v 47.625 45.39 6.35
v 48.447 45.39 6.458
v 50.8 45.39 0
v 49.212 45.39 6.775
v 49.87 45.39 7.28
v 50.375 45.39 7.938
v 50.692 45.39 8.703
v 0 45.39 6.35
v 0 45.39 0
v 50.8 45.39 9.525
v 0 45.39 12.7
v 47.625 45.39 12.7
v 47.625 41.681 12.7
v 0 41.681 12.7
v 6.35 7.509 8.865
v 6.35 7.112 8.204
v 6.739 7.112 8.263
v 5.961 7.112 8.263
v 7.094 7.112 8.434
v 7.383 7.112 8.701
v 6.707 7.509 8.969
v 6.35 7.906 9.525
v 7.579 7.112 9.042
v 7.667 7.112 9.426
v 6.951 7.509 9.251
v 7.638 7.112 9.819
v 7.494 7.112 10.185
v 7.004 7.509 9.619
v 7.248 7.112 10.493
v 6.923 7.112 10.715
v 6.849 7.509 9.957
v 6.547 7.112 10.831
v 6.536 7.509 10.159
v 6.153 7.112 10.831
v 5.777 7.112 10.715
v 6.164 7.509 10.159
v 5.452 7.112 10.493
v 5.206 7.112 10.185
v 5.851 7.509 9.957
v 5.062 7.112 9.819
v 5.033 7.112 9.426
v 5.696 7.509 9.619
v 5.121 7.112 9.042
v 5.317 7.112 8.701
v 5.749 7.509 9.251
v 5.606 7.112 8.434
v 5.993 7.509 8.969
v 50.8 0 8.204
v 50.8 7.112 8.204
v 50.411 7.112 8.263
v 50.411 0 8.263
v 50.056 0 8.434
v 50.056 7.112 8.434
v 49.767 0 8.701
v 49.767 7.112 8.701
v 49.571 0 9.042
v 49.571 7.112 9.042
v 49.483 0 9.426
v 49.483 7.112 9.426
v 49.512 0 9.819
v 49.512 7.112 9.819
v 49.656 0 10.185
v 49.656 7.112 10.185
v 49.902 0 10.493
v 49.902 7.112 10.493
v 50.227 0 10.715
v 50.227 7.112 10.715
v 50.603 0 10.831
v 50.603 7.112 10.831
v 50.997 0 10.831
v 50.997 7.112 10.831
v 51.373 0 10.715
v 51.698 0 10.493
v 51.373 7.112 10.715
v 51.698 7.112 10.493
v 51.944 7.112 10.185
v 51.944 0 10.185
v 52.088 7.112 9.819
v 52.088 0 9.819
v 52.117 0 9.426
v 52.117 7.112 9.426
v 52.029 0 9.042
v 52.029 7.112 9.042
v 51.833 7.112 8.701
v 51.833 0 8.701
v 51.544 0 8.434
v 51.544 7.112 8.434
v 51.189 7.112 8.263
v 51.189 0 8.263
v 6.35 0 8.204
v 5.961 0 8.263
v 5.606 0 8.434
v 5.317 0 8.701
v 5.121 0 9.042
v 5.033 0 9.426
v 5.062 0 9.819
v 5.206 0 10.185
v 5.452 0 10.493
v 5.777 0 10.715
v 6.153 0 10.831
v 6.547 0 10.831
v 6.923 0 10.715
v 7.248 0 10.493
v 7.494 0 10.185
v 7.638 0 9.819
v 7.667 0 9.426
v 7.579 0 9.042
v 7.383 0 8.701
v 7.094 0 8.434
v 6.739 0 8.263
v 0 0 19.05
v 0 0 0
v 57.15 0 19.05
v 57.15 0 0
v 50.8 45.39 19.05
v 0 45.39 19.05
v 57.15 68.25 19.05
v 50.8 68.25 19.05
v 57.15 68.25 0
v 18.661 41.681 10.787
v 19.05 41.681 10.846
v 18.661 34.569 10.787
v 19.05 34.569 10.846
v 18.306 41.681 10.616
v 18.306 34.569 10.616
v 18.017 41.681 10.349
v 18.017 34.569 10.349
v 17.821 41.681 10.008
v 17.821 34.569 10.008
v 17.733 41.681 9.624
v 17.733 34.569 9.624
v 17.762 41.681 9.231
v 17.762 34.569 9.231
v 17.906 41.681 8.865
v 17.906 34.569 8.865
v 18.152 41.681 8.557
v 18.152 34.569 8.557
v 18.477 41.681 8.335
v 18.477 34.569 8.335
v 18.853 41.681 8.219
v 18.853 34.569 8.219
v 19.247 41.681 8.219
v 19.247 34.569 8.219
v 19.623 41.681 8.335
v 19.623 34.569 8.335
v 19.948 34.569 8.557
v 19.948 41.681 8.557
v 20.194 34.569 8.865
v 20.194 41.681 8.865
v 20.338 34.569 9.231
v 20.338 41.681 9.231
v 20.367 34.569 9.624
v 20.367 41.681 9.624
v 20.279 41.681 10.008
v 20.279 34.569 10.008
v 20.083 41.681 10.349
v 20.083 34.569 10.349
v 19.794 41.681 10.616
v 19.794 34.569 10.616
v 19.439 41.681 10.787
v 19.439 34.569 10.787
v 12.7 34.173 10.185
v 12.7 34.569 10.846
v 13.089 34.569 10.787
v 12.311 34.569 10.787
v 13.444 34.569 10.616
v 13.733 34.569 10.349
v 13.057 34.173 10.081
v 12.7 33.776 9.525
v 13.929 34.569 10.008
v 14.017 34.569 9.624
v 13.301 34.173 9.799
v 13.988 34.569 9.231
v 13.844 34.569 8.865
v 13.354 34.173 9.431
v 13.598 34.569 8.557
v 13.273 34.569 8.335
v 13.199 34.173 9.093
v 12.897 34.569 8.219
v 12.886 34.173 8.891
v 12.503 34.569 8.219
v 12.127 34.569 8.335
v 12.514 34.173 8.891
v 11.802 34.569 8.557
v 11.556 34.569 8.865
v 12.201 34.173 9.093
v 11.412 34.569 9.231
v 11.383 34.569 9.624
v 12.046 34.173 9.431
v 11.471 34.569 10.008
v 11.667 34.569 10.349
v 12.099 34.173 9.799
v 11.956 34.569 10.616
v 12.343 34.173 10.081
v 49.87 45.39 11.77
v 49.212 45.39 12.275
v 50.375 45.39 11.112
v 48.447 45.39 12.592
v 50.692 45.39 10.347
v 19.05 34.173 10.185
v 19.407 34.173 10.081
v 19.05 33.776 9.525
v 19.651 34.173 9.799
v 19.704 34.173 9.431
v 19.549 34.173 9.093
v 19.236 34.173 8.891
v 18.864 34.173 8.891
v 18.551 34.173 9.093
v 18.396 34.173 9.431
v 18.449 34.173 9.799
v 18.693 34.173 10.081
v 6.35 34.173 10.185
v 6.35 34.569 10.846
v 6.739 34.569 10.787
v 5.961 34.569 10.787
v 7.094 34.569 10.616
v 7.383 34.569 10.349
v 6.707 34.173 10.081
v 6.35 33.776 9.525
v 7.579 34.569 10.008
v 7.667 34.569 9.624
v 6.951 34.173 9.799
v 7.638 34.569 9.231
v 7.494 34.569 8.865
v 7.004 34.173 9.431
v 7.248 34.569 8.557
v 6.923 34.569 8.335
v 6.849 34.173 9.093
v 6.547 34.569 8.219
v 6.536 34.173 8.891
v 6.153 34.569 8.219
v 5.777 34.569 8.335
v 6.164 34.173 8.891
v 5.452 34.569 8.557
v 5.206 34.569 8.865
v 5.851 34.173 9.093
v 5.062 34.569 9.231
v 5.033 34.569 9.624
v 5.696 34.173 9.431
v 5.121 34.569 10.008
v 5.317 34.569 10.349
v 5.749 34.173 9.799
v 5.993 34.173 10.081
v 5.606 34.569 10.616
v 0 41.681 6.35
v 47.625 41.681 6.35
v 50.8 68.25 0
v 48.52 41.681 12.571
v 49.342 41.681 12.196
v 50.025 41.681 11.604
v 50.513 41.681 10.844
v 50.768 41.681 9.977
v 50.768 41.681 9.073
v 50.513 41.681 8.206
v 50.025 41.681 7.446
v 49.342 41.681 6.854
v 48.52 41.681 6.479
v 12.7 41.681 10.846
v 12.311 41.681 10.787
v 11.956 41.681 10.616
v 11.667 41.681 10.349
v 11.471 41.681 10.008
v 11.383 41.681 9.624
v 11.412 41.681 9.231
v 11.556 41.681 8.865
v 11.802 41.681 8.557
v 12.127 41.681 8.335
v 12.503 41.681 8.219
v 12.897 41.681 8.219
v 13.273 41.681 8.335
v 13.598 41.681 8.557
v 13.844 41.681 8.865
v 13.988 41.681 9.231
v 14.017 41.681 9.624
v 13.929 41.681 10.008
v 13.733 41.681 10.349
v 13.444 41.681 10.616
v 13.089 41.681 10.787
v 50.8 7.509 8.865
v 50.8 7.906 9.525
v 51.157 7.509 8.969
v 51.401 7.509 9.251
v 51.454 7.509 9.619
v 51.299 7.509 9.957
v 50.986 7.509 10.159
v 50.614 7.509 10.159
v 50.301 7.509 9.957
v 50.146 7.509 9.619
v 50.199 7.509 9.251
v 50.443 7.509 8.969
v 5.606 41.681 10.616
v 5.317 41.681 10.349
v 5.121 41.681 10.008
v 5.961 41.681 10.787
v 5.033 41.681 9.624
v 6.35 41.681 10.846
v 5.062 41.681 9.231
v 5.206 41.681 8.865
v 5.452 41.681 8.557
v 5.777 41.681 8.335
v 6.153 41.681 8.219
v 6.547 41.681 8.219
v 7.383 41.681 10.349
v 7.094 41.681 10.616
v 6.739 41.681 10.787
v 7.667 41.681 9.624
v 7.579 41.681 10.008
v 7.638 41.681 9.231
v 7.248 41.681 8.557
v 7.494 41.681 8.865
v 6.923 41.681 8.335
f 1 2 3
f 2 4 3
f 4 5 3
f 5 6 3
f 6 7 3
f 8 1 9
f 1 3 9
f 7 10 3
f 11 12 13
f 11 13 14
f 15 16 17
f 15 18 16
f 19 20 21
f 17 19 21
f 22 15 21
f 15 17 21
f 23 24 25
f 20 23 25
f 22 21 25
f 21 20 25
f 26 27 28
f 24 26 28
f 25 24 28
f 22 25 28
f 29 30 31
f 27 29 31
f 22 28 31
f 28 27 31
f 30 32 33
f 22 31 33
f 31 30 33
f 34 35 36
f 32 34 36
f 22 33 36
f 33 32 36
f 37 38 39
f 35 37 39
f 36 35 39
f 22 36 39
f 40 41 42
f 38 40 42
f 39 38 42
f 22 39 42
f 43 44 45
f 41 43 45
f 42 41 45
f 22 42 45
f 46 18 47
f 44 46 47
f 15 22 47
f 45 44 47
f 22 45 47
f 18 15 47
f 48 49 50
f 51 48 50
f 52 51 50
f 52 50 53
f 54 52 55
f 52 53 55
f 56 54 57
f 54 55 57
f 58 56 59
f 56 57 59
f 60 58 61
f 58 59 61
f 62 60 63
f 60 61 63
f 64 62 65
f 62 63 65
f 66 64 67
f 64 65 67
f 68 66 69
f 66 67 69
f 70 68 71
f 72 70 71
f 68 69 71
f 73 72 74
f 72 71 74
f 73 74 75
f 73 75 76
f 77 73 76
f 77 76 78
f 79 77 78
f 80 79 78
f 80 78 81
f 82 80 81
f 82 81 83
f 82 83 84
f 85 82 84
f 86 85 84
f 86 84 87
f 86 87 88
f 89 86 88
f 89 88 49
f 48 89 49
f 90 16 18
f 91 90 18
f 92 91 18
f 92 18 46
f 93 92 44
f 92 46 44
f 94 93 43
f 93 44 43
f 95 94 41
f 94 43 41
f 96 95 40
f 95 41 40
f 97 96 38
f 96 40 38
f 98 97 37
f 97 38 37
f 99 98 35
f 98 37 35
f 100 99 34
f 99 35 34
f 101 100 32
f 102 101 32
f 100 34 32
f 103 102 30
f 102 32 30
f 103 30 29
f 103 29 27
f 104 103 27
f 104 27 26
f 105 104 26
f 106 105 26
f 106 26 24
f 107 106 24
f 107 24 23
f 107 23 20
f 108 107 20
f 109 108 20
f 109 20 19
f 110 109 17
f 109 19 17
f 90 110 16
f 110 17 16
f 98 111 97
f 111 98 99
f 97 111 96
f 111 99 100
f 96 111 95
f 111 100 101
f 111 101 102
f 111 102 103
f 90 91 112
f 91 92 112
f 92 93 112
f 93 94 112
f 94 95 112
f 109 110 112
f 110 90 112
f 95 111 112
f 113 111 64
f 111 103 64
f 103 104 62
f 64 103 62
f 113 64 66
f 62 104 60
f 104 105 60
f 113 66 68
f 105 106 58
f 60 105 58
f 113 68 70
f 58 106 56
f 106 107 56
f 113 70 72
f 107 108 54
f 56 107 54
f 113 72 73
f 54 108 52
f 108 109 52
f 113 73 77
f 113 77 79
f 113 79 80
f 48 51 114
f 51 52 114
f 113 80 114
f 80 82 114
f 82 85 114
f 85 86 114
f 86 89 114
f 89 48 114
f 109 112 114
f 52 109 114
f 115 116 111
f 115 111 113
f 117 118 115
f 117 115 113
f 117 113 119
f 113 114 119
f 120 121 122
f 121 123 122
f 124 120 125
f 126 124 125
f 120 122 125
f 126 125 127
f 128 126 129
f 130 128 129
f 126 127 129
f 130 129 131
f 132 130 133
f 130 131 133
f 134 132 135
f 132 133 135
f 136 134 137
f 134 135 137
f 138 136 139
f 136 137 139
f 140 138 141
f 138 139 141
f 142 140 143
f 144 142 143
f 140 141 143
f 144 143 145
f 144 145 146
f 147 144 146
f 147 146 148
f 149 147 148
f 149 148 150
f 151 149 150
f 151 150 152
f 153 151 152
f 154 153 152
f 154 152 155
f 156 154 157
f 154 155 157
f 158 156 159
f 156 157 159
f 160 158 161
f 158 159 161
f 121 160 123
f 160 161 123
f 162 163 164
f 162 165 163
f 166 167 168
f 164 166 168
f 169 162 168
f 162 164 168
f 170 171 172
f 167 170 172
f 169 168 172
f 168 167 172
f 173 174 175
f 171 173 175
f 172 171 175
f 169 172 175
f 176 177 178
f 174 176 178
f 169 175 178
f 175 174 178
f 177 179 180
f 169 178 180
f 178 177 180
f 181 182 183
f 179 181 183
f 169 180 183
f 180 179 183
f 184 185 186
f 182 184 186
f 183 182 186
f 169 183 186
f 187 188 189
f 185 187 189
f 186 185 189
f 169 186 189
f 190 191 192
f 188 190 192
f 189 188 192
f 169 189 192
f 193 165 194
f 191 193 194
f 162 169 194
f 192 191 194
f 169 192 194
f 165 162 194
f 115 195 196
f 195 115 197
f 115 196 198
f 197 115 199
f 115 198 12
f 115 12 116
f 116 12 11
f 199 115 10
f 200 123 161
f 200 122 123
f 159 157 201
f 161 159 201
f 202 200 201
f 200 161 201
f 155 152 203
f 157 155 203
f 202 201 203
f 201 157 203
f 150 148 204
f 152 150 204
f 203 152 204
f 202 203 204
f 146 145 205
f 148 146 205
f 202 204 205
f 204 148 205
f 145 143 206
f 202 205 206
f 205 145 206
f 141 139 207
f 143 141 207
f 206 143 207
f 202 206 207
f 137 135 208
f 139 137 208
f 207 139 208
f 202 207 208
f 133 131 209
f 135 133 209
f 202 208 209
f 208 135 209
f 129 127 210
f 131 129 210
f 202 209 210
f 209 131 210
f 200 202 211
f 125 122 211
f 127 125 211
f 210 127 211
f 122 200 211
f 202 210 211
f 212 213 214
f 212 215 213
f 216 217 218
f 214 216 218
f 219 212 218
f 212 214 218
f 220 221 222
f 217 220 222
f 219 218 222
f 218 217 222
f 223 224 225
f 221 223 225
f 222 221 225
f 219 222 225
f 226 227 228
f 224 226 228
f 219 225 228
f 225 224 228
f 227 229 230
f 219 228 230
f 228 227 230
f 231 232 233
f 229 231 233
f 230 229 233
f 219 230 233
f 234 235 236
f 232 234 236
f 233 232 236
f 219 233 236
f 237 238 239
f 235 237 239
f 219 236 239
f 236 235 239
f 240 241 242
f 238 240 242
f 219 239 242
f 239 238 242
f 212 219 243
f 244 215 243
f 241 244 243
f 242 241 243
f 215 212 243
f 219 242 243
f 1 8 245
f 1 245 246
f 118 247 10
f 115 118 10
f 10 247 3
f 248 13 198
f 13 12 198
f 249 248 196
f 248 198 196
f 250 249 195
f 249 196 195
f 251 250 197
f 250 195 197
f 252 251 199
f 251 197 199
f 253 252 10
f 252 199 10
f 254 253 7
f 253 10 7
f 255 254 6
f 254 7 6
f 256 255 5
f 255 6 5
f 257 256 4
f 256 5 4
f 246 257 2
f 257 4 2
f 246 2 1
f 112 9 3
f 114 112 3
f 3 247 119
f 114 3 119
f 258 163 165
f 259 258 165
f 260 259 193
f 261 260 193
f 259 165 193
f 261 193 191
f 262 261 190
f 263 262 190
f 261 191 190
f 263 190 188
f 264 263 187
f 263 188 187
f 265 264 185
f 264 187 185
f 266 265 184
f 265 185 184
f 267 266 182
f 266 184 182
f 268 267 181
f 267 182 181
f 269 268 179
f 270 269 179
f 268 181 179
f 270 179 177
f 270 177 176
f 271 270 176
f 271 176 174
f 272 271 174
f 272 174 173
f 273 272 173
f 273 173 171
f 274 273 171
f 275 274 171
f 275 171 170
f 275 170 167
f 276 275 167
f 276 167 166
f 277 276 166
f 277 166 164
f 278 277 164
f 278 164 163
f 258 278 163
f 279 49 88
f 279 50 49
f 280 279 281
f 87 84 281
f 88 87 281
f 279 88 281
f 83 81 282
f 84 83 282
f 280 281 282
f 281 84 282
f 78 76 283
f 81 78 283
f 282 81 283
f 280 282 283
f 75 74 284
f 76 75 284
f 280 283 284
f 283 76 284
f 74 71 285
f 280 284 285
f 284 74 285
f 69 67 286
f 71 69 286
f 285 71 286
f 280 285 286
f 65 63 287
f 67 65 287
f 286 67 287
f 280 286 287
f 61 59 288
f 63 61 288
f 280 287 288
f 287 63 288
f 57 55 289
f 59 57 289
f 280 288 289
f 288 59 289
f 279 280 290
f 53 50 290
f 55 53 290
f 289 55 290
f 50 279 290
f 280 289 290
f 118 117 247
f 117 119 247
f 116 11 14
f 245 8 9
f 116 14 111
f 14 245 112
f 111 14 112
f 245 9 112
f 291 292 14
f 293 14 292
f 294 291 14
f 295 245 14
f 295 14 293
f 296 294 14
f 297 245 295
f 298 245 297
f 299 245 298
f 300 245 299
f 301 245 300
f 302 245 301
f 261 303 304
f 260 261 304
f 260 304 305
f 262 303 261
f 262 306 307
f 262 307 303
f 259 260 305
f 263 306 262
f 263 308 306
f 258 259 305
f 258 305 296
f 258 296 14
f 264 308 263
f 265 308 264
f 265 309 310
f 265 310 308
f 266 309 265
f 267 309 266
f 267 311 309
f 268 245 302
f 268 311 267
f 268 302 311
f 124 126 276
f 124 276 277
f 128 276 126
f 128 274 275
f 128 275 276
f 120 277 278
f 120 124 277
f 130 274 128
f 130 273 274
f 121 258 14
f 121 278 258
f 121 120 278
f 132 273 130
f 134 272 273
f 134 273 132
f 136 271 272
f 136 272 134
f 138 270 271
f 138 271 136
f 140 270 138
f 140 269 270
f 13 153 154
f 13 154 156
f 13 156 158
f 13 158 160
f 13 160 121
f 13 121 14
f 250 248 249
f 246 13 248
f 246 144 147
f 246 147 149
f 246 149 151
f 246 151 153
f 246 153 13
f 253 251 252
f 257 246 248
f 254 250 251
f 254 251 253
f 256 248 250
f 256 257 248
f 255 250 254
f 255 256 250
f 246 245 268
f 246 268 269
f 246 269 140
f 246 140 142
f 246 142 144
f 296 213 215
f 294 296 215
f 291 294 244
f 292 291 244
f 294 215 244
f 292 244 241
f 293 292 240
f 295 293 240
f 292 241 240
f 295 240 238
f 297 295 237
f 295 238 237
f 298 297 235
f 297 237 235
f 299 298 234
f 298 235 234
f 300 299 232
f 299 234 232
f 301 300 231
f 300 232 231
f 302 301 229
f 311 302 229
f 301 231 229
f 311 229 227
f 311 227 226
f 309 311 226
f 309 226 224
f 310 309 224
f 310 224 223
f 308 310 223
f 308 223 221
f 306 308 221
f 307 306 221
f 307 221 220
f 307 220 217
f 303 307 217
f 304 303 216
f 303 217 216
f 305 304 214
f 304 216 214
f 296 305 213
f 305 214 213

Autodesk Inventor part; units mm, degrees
ref_plane "YZ Plane" through (0, 0, 0) normal (1, 0, 0) x (0, 1, 0)
ref_plane "XZ Plane" through (0, 0, 0) normal (0, 1, 0) x (-1, 0, 0)
ref_plane "XY Plane" through (0, 0, 0) normal (0, 0, 1) x (1, 0, 0)
sketch "Sketch1" plane through (0, 0, 0) normal (0, 0, 1) x (1, 0, 0)
  line L0 (0, 0) -> (57.15, 0)
  line L1 (57.15, 0) -> (57.15, 68.2498)
  line L2 (57.15, 68.2498) -> (0, 68.2498)
  line L3 (0, 68.2498) -> (0, 0)
  line L4 (0, 68.2498) -> (50.8, 68.2498)
  line L5 (50.8, 68.2498) -> (50.8, 45.3898)
  line L6 (50.8, 45.3898) -> (0, 45.3898)
  line L7 (0, 45.3898) -> (0, 68.2498)
  dimension "d0" = 57.15
  dimension "d1" = 68.2498
  dimension "d2" = 50.8
  dimension "d3" = 22.86
extrude "Extrusion1" add sketch "Sketch1" along normal blind 19.05 contours L3 L6 L5 L2 L1 L0
sketch "Sketch2" plane through (0, 45.3898, 0) normal (0, 1, 0) x (1, 0, 0)
  line L0 (0, 0) -> (0, -19.05) projected
  line L1 (0, -6.35) -> (47.625, -6.35)
  line L2 (47.625, -6.35) -> (47.625, -12.7)
  line L3 (47.625, -12.7) -> (0, -12.7)
  line L4 (0, -12.7) -> (0, -6.35)
  line L5 (0, 0) -> (50.8, 0) projected
  circle A0 centre (47.625, -9.525) radius 3.175
  dimension "d6" = 47.625
  dimension "d7" = 6.35
  dimension "d8" = 6.35
extrude "Extrusion2" cut sketch "Sketch2" against normal blind 3.7084
sketch "Sketch3" plane through (0, 41.6814, 0) normal (0, 1, 0) x (1, 0, 0)
  line L0 (47.625, -12.7) -> (0, -12.7) projected
  line L1 (0, -6.35) -> (47.625, -6.35) projected
  line L2 (0, -12.7) -> (0, -6.35) projected
  point P0 (0, 0)
  point P1 (6.35, -9.525)
  point P2 (12.7, -9.525)
  point P3 (19.05, -9.525)
  dimension "d11" = 6.35
  dimension "d12" = 3.175
  dimension "d13" = 3.175
  dimension "d14" = 3.175
  dimension "d15" = 6.35
  dimension "d16" = 12.7
  dimension "d17" = 19.05
sketch "Sketch4" plane through (0, 0, 0) normal (0, -1, 0) x (1, 0, 0)
  line L0 (0, 0) -> (57.15, 0) projected
  line L1 (0, 19.05) -> (57.15, 19.05) projected
  line L2 (0, 0) -> (0, 19.05) projected
  line L3 (57.15, 0) -> (57.15, 19.05) projected
  point P0 (6.35, 9.525)
  point P1 (50.8, 9.525)
  dimension "d18" = 19.05
  dimension "d19" = 9.525
  dimension "d20" = 9.525
  dimension "d21" = 6.35
  dimension "d22" = 6.35
hole "Hole1" at (50.8, 0, 9.525) at (6.35, 0, 9.525) direction (0, 1, 0) diameter 2.6416 depth 7.112 tip angle 118 thread size "6-32 UNC" class "2B" standard "ANSI Unified Screw Threads"
hole "Hole2" at (6.35, 41.6814, 9.525) at (12.7, 41.6814, 9.525) at (19.05, 41.6814, 9.525) direction (0, -1, 0) diameter 2.6416 depth 7.112 tip angle 118 thread size "6-32 UNC" class "2B" standard "ANSI Unified Screw Threads"
equation "\"d8\" = d7"
equation "\"d12\" = 0.5 * d11"
equation "\"d13\" = d12"
equation "\"d14\" = d13"
equation "\"d15\" = d11"
equation "\"d19\" = 0.5 * d18"
equation "\"d20\" = d19"
equation "\"d22\" = d21"
properties part number "Spring block"
